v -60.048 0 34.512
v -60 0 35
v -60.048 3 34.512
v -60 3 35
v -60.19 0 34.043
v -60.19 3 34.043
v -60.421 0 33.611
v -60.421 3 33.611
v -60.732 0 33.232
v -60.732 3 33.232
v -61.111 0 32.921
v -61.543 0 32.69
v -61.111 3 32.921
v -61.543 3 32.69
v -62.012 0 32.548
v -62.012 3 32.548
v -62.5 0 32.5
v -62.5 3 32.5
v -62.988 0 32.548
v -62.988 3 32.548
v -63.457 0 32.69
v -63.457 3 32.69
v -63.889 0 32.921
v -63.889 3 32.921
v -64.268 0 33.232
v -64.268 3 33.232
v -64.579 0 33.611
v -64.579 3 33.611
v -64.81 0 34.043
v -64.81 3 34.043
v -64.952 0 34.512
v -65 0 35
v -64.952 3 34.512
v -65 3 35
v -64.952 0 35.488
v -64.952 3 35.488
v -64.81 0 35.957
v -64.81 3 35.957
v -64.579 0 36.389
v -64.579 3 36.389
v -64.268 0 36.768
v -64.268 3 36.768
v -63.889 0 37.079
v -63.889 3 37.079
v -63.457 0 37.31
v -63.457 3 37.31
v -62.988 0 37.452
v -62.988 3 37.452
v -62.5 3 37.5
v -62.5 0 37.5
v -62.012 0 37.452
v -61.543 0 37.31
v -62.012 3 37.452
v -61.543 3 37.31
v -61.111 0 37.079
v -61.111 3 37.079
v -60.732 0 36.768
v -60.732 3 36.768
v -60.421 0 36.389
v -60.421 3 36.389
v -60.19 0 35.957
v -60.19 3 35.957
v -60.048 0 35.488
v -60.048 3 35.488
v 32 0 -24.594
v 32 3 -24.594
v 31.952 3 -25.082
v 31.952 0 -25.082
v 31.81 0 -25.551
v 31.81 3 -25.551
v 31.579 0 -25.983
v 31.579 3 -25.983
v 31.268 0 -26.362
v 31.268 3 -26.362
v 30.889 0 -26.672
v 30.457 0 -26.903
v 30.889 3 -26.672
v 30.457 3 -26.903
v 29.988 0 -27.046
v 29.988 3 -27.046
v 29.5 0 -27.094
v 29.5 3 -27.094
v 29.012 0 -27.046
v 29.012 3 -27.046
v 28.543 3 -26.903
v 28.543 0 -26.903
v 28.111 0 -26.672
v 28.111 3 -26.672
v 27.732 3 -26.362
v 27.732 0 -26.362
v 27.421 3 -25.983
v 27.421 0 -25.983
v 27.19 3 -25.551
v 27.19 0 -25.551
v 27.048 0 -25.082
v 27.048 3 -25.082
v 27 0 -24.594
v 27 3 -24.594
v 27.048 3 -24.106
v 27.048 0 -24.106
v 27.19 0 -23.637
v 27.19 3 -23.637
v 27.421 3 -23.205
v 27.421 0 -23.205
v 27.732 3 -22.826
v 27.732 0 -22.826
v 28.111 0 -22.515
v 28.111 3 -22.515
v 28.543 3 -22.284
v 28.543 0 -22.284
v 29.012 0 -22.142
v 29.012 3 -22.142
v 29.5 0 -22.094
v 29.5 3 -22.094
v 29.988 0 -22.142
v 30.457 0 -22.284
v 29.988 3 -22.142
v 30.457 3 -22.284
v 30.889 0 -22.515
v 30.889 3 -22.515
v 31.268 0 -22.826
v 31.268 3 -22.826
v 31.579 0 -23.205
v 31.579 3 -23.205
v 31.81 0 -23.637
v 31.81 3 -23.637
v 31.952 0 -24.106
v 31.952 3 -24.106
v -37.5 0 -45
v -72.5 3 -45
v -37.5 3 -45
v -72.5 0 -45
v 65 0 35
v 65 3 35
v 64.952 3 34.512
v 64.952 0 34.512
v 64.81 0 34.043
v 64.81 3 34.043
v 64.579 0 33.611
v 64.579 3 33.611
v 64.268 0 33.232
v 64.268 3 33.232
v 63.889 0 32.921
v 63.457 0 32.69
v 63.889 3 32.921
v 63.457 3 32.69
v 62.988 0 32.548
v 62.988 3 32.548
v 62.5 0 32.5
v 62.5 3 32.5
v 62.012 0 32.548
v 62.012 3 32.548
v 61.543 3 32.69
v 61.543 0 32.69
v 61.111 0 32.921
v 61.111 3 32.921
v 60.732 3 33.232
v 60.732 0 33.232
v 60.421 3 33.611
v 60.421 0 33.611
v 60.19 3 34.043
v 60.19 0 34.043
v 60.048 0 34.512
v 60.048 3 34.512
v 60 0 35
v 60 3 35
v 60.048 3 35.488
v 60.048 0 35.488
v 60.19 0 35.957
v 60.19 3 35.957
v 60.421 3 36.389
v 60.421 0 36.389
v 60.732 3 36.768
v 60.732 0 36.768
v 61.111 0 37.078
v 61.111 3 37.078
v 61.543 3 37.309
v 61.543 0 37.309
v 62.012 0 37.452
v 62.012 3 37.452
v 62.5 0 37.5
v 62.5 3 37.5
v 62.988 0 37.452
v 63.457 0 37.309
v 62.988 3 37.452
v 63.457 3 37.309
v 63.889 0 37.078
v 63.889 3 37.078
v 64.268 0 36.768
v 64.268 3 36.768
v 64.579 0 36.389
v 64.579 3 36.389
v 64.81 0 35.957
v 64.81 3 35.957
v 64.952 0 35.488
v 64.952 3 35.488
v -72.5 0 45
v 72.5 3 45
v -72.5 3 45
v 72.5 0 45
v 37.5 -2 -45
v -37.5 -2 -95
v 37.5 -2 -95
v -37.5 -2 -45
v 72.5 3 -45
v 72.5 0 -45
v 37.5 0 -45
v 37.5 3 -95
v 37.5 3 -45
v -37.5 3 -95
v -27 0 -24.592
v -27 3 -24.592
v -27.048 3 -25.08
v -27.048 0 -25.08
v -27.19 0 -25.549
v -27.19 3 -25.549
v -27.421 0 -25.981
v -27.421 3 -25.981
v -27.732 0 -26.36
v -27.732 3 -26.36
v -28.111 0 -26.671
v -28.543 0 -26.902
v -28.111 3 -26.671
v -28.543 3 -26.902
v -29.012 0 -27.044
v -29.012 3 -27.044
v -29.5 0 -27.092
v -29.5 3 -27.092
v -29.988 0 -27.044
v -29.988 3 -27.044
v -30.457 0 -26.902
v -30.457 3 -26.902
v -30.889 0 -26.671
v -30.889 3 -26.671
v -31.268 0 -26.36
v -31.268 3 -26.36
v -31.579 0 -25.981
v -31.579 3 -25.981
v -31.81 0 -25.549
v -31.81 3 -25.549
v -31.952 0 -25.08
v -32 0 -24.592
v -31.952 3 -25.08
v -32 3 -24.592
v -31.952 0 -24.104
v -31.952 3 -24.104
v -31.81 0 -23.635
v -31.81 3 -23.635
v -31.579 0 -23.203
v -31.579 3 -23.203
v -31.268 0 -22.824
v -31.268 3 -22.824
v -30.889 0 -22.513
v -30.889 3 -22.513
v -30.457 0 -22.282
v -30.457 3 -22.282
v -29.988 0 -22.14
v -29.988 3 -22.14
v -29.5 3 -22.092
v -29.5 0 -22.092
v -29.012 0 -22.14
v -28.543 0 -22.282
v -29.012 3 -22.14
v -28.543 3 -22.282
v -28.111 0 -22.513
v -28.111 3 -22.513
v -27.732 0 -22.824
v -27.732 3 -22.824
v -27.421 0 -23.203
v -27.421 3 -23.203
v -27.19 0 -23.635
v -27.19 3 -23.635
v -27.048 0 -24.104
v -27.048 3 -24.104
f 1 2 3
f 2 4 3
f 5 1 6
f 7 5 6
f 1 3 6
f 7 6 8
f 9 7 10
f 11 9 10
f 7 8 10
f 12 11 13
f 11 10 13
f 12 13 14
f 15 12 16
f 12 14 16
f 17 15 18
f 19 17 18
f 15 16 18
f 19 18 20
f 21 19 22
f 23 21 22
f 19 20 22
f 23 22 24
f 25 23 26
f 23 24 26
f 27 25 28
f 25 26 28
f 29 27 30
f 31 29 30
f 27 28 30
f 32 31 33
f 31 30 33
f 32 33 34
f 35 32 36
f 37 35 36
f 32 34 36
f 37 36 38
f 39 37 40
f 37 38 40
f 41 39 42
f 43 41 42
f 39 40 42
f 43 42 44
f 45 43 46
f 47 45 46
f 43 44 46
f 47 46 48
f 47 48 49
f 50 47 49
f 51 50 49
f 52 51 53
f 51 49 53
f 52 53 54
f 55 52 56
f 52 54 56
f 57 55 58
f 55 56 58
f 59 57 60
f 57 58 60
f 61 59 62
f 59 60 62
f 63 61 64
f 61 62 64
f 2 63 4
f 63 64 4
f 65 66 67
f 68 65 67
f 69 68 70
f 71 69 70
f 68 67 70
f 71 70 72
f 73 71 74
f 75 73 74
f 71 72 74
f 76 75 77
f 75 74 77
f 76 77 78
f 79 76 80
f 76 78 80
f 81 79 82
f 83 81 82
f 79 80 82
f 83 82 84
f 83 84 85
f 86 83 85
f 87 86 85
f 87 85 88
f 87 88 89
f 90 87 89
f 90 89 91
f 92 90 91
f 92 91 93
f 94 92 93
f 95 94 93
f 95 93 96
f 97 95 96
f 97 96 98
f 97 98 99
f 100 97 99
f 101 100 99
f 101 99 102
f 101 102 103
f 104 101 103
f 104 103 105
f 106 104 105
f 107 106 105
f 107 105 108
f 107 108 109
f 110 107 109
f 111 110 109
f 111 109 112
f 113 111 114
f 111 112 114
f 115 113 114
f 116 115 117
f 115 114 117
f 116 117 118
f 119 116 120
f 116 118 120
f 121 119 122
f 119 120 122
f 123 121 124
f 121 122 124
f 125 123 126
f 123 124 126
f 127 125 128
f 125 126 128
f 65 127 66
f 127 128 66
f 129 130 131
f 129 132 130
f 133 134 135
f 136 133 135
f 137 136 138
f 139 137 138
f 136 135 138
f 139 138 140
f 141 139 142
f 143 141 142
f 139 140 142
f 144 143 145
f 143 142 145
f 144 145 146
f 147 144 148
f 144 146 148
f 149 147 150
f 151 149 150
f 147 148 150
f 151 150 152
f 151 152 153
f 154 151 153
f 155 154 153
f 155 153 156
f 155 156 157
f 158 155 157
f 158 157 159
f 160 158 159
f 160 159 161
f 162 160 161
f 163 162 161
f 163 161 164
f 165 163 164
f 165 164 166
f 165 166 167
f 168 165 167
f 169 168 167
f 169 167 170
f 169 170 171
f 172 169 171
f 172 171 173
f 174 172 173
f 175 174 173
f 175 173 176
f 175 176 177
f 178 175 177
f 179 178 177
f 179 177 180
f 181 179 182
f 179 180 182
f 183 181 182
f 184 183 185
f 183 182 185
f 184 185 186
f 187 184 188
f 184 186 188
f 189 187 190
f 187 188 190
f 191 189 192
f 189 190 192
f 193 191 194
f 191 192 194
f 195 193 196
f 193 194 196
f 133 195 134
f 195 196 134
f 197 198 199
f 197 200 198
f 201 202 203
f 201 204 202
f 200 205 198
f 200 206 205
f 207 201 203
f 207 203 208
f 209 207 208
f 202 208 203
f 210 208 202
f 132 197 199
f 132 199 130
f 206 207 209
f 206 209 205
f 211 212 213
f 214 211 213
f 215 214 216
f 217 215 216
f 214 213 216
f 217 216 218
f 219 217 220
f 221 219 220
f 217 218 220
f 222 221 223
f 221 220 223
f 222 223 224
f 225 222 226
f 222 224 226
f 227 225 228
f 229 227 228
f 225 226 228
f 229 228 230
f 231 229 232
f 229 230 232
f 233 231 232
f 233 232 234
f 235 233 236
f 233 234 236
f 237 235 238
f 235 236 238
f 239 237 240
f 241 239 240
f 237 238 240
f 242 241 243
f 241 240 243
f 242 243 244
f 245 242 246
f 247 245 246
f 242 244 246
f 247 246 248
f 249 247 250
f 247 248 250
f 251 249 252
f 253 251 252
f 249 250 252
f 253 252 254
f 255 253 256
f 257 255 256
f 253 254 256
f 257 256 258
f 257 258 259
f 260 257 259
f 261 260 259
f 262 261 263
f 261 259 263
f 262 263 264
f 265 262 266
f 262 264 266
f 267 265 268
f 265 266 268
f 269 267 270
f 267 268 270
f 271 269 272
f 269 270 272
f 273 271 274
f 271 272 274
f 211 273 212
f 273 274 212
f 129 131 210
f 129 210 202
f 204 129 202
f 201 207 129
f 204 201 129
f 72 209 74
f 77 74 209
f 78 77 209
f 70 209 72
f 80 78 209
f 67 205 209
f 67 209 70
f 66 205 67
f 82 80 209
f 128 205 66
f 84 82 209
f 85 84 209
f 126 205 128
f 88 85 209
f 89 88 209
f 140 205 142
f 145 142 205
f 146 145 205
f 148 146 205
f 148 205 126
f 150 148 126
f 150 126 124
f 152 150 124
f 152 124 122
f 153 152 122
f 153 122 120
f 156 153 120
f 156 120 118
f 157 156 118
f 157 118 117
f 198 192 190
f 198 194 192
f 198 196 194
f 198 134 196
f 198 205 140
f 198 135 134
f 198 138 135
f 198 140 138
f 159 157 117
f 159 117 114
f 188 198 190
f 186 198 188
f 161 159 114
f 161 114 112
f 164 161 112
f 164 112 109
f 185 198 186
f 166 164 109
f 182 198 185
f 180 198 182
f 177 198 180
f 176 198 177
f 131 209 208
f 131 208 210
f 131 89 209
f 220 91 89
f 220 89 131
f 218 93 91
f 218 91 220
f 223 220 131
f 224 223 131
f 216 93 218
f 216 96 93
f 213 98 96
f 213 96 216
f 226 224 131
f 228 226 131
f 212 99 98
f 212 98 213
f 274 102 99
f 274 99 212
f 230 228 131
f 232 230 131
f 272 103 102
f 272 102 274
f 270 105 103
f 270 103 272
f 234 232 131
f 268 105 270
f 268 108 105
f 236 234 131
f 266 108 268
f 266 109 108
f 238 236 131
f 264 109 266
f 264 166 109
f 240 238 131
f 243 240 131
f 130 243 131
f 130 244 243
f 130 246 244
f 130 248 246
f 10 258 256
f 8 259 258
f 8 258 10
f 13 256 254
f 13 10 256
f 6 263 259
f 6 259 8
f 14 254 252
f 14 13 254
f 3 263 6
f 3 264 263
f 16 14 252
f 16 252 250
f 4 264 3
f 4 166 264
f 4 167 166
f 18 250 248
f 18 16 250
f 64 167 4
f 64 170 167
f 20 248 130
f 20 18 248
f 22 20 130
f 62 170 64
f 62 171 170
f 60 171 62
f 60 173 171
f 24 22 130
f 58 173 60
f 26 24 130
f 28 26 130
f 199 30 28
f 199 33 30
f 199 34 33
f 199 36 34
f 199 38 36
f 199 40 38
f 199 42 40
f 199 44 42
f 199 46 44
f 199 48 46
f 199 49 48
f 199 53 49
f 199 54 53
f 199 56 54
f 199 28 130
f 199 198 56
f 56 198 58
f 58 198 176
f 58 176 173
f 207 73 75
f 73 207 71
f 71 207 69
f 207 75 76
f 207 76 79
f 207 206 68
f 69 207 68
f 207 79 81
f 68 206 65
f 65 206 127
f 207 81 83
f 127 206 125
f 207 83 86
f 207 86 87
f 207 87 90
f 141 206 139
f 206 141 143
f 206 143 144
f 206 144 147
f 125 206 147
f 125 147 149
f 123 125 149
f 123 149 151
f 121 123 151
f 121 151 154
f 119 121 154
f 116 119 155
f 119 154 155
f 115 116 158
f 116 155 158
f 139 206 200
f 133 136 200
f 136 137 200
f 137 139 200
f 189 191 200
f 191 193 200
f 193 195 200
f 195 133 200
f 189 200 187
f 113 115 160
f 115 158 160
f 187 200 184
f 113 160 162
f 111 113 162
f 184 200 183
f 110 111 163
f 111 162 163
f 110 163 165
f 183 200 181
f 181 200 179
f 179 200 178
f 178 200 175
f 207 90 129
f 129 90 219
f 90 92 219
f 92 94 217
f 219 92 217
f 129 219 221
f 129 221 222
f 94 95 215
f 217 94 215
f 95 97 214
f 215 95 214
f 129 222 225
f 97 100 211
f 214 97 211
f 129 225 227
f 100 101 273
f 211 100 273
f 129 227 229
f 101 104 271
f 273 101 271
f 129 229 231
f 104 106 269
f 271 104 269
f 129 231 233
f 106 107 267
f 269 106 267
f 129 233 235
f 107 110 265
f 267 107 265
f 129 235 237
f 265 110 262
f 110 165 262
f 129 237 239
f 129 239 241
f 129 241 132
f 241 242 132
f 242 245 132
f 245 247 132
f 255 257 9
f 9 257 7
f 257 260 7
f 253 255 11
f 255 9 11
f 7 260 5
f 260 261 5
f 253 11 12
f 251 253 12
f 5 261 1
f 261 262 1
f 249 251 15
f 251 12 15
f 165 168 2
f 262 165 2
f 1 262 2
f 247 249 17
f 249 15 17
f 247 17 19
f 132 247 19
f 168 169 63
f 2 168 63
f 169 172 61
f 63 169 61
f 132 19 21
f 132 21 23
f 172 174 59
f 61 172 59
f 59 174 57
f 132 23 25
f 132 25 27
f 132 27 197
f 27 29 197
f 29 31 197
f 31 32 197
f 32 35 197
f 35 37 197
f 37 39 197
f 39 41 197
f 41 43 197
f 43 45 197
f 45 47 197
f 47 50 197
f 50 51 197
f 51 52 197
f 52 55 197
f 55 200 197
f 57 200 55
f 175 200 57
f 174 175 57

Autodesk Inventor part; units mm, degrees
ref_plane "YZ Plane" through (0, 0, 0) normal (1, 0, 0) x (0, 1, 0)
ref_plane "XZ Plane" through (0, 0, 0) normal (0, 1, 0) x (-1, 0, 0)
ref_plane "XY Plane" through (0, 0, 0) normal (0, 0, 1) x (1, 0, 0)
sketch "Sketch1" plane through (0, 0, 0) normal (0, 1, 0) x (-1, 0, 0)
  line L0 (72.5, -45) -> (-72.5, -45)
  line L1 (-72.5, -45) -> (-72.5, 45)
  line L2 (-72.5, 45) -> (72.5, 45)
  line L3 (72.5, 45) -> (72.5, -45)
  line L4 (72.5, -45) -> (-72.5, 45) construction
  line L5 (-72.5, -45) -> (72.5, 45) construction
  point P0 (0, 0)
  dimension "d0" = 145
  dimension "d1" = 90
extrude "Extrusion1" add sketch "Sketch1" along normal blind 3
sketch "Sketch4" plane through (72.5, 0, -45) normal (0, 0, -1) x (-1, 0, 0)
  line L0 (35, 3) -> (110, 3)
  line L1 (110, 3) -> (110, -2)
  line L2 (110, -2) -> (35, -2)
  line L3 (35, -2) -> (35, 3)
  line L4 (35, 3) -> (110, -2) construction
  line L5 (110, 3) -> (35, -2) construction
  line L6 (0, 3) -> (145, 3) projected
  point P0 (72.5, 0)
  point P1 (72.5, 0.5)
  dimension "d28" = 75
  dimension "d29" = 5
  dimension "d30" = 0
extrude "Extrusion3" add sketch "Sketch4" along normal blind 50
sketch "Sketch3" plane through (0, 3, 0) normal (0, 1, 0) x (1, 0, 0)
  circle A0 centre (62.5, -34.9998) radius 2.5
  circle A1 centre (-62.5, -35) radius 2.5
  circle A2 centre (-29.5, 24.592) radius 2.5
  circle A3 centre (29.5, 24.5938) radius 2.5
  line L0 (-72.5, 45) -> (-72.5, -45) projected
  line L1 (-72.5, -45) -> (72.5, -45) projected
  point P0 (0, 0)
  dimension "d4" = 5
  dimension "d7" = 5
  dimension "d10" = 5
  dimension "d13" = 5
  dimension "d20" = 59
  dimension "d21" = 125
  dimension "d22" = 33
  dimension "d23" = 59.592
  dimension "d24" = 10
  dimension "d25" = 10
extrude "Extrusion2" cut sketch "Sketch3" against normal through all
properties part number "chasis_arriba"
